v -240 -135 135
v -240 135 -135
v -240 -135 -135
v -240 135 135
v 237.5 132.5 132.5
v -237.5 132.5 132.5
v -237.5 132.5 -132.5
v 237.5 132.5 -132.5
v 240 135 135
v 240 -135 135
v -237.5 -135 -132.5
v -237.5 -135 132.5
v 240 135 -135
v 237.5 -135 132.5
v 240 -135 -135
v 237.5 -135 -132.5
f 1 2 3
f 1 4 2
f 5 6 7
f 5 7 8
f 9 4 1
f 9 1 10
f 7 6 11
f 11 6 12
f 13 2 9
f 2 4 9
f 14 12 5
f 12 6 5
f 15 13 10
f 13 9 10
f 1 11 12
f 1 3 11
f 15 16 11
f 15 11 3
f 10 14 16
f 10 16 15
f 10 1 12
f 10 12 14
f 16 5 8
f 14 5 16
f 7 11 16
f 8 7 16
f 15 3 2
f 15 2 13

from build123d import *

# Parameters (mm, degrees)
F0_W      = 480
F0_H      = 270
F1_DEPTH  = 135
F1_FACE_W = 480
F1_FACE_H = 270
F2_DEPTH  = 135
F3_T      = -2.5


with BuildPart() as f1:
    # F0 (on Top) → F1 (new body)
    with BuildSketch(Plane.XY):
        Rectangle(F0_W, F0_H)
    extrude(amount=F1_DEPTH)

    # F1_face (on face) → F2 (join)
    with BuildSketch(Plane(origin=(0, 0, 0), x_dir=(1, 0, 0), z_dir=(0, 0, -1))):
        Rectangle(F1_FACE_W, F1_FACE_H)
    extrude(amount=F2_DEPTH)

    # F3
    f3_openings = [f1.faces().sort_by_distance(p)[0] for p in [
        (0, -135, 0),
    ]]
    offset(amount=F3_T, openings=f3_openings)


solid = f1.part
